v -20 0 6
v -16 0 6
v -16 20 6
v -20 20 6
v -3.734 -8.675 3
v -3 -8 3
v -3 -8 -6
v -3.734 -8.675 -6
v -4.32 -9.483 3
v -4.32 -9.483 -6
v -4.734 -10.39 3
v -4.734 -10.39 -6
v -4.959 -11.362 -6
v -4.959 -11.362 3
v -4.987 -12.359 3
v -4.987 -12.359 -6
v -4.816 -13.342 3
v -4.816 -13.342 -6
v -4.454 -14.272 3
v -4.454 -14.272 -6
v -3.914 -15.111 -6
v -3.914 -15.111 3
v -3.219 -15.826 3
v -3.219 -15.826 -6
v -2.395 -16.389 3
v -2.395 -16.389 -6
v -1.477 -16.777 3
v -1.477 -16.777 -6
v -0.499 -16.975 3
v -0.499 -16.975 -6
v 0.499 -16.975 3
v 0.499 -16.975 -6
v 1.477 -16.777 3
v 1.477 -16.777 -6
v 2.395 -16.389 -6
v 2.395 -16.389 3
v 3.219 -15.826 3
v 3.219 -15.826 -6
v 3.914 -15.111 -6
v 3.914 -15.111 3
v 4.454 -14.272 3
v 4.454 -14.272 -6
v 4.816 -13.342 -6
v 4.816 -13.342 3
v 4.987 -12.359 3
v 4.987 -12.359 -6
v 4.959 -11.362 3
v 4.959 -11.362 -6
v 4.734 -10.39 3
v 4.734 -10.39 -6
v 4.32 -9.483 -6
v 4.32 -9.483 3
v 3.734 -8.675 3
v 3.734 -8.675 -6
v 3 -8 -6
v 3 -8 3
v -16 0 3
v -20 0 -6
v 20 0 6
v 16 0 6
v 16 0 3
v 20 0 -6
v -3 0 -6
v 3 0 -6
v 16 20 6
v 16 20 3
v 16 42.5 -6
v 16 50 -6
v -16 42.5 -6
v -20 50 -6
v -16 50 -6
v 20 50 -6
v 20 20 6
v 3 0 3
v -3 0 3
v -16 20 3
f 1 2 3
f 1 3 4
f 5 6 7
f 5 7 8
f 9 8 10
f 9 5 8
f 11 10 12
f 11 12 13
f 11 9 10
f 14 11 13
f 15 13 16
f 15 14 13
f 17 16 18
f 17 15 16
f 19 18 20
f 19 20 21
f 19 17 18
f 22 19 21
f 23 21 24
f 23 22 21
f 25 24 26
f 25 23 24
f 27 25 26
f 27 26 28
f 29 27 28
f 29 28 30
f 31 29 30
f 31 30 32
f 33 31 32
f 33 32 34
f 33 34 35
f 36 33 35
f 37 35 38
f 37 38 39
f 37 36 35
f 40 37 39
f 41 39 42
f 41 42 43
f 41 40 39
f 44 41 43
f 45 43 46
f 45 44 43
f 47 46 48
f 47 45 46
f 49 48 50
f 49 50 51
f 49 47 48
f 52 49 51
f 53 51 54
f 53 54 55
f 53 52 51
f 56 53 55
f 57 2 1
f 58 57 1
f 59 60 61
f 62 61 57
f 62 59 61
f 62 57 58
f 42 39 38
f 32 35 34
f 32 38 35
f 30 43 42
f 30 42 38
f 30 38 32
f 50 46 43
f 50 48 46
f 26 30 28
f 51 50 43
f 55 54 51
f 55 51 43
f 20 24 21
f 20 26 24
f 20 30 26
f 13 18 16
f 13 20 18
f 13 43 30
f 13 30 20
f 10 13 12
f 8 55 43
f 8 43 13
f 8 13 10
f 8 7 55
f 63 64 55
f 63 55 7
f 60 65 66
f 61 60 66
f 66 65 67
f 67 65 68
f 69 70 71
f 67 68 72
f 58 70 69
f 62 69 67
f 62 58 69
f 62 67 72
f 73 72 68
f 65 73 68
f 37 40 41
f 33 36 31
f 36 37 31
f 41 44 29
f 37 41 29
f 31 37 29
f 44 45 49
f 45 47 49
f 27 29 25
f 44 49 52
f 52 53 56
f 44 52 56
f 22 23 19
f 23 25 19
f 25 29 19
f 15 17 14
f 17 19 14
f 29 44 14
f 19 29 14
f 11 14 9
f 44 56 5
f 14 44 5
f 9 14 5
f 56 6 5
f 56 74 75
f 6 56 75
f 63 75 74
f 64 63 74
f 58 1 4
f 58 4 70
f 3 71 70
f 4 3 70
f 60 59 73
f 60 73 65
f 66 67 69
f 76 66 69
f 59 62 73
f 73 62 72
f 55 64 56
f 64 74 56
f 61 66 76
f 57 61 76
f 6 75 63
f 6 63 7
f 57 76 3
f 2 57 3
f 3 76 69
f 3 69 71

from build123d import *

# Parameters (mm, degrees)
SKETCH004_W          = 40
SKETCH004_H          = 12
POCKET001_DEPTH      = 50.001
POCKET001_DEPTH_BACK = -0.001
POCKET_DEPTH         = 50.001
POCKET_DEPTH_BACK    = -0.001
PAD_DEPTH            = 3
PAD_DEPTH_BACK       = 6


with BuildPart() as body:
    # AdditivePipe: sweep along a path in Sketch
    with BuildLine(Plane.YZ) as additivepipe_path:
        Line((0, 0), (20, 0))
        Line((20, 0), (50, -12))
    # Sketch001 → AdditivePipe (sweep)
    with BuildSketch(Plane.XZ):
        Polygon((-20, 6), (-20, -6), (20, -6), (20, 6), (16, 6), (16, 3), (9, 3), (-9, 3), (-16, 3), (-16, 6), align=None)
    sweep(path=additivepipe_path.line)

    # Sketch004 → Pocket001 (cut, two sides)
    with BuildSketch(Plane.XZ) as pocket001_sk:
        with Locations((0, -12)):
            Rectangle(SKETCH004_W, SKETCH004_H)
    extrude(amount=-POCKET001_DEPTH, mode=Mode.SUBTRACT)
    extrude(pocket001_sk.sketch, amount=-POCKET001_DEPTH_BACK, mode=Mode.SUBTRACT)

    # Sketch004 → Pocket (cut, two sides)
    with BuildSketch(Plane.XZ) as pocket_sk:
        with Locations((0, -12)):
            Rectangle(SKETCH004_W, SKETCH004_H)
    extrude(amount=-POCKET_DEPTH, mode=Mode.SUBTRACT)
    extrude(pocket_sk.sketch, amount=-POCKET_DEPTH_BACK, mode=Mode.SUBTRACT)


with BuildPart() as body001:
    # Sketch005 → Pad (new body, two sides)
    with BuildSketch(Plane.XY) as pad_sk:
        with BuildLine():
            Line((-3, 0), (3, 0))
            Line((3, 0), (3, -8))
            ThreePointArc((-3, -8), (0, -17), (3, -8))
            Line((-3, 0), (-3, -8))
        make_face()
    extrude(amount=PAD_DEPTH)
    extrude(pad_sk.sketch, amount=-PAD_DEPTH_BACK)


solid = Compound([body.part, body001.part])
